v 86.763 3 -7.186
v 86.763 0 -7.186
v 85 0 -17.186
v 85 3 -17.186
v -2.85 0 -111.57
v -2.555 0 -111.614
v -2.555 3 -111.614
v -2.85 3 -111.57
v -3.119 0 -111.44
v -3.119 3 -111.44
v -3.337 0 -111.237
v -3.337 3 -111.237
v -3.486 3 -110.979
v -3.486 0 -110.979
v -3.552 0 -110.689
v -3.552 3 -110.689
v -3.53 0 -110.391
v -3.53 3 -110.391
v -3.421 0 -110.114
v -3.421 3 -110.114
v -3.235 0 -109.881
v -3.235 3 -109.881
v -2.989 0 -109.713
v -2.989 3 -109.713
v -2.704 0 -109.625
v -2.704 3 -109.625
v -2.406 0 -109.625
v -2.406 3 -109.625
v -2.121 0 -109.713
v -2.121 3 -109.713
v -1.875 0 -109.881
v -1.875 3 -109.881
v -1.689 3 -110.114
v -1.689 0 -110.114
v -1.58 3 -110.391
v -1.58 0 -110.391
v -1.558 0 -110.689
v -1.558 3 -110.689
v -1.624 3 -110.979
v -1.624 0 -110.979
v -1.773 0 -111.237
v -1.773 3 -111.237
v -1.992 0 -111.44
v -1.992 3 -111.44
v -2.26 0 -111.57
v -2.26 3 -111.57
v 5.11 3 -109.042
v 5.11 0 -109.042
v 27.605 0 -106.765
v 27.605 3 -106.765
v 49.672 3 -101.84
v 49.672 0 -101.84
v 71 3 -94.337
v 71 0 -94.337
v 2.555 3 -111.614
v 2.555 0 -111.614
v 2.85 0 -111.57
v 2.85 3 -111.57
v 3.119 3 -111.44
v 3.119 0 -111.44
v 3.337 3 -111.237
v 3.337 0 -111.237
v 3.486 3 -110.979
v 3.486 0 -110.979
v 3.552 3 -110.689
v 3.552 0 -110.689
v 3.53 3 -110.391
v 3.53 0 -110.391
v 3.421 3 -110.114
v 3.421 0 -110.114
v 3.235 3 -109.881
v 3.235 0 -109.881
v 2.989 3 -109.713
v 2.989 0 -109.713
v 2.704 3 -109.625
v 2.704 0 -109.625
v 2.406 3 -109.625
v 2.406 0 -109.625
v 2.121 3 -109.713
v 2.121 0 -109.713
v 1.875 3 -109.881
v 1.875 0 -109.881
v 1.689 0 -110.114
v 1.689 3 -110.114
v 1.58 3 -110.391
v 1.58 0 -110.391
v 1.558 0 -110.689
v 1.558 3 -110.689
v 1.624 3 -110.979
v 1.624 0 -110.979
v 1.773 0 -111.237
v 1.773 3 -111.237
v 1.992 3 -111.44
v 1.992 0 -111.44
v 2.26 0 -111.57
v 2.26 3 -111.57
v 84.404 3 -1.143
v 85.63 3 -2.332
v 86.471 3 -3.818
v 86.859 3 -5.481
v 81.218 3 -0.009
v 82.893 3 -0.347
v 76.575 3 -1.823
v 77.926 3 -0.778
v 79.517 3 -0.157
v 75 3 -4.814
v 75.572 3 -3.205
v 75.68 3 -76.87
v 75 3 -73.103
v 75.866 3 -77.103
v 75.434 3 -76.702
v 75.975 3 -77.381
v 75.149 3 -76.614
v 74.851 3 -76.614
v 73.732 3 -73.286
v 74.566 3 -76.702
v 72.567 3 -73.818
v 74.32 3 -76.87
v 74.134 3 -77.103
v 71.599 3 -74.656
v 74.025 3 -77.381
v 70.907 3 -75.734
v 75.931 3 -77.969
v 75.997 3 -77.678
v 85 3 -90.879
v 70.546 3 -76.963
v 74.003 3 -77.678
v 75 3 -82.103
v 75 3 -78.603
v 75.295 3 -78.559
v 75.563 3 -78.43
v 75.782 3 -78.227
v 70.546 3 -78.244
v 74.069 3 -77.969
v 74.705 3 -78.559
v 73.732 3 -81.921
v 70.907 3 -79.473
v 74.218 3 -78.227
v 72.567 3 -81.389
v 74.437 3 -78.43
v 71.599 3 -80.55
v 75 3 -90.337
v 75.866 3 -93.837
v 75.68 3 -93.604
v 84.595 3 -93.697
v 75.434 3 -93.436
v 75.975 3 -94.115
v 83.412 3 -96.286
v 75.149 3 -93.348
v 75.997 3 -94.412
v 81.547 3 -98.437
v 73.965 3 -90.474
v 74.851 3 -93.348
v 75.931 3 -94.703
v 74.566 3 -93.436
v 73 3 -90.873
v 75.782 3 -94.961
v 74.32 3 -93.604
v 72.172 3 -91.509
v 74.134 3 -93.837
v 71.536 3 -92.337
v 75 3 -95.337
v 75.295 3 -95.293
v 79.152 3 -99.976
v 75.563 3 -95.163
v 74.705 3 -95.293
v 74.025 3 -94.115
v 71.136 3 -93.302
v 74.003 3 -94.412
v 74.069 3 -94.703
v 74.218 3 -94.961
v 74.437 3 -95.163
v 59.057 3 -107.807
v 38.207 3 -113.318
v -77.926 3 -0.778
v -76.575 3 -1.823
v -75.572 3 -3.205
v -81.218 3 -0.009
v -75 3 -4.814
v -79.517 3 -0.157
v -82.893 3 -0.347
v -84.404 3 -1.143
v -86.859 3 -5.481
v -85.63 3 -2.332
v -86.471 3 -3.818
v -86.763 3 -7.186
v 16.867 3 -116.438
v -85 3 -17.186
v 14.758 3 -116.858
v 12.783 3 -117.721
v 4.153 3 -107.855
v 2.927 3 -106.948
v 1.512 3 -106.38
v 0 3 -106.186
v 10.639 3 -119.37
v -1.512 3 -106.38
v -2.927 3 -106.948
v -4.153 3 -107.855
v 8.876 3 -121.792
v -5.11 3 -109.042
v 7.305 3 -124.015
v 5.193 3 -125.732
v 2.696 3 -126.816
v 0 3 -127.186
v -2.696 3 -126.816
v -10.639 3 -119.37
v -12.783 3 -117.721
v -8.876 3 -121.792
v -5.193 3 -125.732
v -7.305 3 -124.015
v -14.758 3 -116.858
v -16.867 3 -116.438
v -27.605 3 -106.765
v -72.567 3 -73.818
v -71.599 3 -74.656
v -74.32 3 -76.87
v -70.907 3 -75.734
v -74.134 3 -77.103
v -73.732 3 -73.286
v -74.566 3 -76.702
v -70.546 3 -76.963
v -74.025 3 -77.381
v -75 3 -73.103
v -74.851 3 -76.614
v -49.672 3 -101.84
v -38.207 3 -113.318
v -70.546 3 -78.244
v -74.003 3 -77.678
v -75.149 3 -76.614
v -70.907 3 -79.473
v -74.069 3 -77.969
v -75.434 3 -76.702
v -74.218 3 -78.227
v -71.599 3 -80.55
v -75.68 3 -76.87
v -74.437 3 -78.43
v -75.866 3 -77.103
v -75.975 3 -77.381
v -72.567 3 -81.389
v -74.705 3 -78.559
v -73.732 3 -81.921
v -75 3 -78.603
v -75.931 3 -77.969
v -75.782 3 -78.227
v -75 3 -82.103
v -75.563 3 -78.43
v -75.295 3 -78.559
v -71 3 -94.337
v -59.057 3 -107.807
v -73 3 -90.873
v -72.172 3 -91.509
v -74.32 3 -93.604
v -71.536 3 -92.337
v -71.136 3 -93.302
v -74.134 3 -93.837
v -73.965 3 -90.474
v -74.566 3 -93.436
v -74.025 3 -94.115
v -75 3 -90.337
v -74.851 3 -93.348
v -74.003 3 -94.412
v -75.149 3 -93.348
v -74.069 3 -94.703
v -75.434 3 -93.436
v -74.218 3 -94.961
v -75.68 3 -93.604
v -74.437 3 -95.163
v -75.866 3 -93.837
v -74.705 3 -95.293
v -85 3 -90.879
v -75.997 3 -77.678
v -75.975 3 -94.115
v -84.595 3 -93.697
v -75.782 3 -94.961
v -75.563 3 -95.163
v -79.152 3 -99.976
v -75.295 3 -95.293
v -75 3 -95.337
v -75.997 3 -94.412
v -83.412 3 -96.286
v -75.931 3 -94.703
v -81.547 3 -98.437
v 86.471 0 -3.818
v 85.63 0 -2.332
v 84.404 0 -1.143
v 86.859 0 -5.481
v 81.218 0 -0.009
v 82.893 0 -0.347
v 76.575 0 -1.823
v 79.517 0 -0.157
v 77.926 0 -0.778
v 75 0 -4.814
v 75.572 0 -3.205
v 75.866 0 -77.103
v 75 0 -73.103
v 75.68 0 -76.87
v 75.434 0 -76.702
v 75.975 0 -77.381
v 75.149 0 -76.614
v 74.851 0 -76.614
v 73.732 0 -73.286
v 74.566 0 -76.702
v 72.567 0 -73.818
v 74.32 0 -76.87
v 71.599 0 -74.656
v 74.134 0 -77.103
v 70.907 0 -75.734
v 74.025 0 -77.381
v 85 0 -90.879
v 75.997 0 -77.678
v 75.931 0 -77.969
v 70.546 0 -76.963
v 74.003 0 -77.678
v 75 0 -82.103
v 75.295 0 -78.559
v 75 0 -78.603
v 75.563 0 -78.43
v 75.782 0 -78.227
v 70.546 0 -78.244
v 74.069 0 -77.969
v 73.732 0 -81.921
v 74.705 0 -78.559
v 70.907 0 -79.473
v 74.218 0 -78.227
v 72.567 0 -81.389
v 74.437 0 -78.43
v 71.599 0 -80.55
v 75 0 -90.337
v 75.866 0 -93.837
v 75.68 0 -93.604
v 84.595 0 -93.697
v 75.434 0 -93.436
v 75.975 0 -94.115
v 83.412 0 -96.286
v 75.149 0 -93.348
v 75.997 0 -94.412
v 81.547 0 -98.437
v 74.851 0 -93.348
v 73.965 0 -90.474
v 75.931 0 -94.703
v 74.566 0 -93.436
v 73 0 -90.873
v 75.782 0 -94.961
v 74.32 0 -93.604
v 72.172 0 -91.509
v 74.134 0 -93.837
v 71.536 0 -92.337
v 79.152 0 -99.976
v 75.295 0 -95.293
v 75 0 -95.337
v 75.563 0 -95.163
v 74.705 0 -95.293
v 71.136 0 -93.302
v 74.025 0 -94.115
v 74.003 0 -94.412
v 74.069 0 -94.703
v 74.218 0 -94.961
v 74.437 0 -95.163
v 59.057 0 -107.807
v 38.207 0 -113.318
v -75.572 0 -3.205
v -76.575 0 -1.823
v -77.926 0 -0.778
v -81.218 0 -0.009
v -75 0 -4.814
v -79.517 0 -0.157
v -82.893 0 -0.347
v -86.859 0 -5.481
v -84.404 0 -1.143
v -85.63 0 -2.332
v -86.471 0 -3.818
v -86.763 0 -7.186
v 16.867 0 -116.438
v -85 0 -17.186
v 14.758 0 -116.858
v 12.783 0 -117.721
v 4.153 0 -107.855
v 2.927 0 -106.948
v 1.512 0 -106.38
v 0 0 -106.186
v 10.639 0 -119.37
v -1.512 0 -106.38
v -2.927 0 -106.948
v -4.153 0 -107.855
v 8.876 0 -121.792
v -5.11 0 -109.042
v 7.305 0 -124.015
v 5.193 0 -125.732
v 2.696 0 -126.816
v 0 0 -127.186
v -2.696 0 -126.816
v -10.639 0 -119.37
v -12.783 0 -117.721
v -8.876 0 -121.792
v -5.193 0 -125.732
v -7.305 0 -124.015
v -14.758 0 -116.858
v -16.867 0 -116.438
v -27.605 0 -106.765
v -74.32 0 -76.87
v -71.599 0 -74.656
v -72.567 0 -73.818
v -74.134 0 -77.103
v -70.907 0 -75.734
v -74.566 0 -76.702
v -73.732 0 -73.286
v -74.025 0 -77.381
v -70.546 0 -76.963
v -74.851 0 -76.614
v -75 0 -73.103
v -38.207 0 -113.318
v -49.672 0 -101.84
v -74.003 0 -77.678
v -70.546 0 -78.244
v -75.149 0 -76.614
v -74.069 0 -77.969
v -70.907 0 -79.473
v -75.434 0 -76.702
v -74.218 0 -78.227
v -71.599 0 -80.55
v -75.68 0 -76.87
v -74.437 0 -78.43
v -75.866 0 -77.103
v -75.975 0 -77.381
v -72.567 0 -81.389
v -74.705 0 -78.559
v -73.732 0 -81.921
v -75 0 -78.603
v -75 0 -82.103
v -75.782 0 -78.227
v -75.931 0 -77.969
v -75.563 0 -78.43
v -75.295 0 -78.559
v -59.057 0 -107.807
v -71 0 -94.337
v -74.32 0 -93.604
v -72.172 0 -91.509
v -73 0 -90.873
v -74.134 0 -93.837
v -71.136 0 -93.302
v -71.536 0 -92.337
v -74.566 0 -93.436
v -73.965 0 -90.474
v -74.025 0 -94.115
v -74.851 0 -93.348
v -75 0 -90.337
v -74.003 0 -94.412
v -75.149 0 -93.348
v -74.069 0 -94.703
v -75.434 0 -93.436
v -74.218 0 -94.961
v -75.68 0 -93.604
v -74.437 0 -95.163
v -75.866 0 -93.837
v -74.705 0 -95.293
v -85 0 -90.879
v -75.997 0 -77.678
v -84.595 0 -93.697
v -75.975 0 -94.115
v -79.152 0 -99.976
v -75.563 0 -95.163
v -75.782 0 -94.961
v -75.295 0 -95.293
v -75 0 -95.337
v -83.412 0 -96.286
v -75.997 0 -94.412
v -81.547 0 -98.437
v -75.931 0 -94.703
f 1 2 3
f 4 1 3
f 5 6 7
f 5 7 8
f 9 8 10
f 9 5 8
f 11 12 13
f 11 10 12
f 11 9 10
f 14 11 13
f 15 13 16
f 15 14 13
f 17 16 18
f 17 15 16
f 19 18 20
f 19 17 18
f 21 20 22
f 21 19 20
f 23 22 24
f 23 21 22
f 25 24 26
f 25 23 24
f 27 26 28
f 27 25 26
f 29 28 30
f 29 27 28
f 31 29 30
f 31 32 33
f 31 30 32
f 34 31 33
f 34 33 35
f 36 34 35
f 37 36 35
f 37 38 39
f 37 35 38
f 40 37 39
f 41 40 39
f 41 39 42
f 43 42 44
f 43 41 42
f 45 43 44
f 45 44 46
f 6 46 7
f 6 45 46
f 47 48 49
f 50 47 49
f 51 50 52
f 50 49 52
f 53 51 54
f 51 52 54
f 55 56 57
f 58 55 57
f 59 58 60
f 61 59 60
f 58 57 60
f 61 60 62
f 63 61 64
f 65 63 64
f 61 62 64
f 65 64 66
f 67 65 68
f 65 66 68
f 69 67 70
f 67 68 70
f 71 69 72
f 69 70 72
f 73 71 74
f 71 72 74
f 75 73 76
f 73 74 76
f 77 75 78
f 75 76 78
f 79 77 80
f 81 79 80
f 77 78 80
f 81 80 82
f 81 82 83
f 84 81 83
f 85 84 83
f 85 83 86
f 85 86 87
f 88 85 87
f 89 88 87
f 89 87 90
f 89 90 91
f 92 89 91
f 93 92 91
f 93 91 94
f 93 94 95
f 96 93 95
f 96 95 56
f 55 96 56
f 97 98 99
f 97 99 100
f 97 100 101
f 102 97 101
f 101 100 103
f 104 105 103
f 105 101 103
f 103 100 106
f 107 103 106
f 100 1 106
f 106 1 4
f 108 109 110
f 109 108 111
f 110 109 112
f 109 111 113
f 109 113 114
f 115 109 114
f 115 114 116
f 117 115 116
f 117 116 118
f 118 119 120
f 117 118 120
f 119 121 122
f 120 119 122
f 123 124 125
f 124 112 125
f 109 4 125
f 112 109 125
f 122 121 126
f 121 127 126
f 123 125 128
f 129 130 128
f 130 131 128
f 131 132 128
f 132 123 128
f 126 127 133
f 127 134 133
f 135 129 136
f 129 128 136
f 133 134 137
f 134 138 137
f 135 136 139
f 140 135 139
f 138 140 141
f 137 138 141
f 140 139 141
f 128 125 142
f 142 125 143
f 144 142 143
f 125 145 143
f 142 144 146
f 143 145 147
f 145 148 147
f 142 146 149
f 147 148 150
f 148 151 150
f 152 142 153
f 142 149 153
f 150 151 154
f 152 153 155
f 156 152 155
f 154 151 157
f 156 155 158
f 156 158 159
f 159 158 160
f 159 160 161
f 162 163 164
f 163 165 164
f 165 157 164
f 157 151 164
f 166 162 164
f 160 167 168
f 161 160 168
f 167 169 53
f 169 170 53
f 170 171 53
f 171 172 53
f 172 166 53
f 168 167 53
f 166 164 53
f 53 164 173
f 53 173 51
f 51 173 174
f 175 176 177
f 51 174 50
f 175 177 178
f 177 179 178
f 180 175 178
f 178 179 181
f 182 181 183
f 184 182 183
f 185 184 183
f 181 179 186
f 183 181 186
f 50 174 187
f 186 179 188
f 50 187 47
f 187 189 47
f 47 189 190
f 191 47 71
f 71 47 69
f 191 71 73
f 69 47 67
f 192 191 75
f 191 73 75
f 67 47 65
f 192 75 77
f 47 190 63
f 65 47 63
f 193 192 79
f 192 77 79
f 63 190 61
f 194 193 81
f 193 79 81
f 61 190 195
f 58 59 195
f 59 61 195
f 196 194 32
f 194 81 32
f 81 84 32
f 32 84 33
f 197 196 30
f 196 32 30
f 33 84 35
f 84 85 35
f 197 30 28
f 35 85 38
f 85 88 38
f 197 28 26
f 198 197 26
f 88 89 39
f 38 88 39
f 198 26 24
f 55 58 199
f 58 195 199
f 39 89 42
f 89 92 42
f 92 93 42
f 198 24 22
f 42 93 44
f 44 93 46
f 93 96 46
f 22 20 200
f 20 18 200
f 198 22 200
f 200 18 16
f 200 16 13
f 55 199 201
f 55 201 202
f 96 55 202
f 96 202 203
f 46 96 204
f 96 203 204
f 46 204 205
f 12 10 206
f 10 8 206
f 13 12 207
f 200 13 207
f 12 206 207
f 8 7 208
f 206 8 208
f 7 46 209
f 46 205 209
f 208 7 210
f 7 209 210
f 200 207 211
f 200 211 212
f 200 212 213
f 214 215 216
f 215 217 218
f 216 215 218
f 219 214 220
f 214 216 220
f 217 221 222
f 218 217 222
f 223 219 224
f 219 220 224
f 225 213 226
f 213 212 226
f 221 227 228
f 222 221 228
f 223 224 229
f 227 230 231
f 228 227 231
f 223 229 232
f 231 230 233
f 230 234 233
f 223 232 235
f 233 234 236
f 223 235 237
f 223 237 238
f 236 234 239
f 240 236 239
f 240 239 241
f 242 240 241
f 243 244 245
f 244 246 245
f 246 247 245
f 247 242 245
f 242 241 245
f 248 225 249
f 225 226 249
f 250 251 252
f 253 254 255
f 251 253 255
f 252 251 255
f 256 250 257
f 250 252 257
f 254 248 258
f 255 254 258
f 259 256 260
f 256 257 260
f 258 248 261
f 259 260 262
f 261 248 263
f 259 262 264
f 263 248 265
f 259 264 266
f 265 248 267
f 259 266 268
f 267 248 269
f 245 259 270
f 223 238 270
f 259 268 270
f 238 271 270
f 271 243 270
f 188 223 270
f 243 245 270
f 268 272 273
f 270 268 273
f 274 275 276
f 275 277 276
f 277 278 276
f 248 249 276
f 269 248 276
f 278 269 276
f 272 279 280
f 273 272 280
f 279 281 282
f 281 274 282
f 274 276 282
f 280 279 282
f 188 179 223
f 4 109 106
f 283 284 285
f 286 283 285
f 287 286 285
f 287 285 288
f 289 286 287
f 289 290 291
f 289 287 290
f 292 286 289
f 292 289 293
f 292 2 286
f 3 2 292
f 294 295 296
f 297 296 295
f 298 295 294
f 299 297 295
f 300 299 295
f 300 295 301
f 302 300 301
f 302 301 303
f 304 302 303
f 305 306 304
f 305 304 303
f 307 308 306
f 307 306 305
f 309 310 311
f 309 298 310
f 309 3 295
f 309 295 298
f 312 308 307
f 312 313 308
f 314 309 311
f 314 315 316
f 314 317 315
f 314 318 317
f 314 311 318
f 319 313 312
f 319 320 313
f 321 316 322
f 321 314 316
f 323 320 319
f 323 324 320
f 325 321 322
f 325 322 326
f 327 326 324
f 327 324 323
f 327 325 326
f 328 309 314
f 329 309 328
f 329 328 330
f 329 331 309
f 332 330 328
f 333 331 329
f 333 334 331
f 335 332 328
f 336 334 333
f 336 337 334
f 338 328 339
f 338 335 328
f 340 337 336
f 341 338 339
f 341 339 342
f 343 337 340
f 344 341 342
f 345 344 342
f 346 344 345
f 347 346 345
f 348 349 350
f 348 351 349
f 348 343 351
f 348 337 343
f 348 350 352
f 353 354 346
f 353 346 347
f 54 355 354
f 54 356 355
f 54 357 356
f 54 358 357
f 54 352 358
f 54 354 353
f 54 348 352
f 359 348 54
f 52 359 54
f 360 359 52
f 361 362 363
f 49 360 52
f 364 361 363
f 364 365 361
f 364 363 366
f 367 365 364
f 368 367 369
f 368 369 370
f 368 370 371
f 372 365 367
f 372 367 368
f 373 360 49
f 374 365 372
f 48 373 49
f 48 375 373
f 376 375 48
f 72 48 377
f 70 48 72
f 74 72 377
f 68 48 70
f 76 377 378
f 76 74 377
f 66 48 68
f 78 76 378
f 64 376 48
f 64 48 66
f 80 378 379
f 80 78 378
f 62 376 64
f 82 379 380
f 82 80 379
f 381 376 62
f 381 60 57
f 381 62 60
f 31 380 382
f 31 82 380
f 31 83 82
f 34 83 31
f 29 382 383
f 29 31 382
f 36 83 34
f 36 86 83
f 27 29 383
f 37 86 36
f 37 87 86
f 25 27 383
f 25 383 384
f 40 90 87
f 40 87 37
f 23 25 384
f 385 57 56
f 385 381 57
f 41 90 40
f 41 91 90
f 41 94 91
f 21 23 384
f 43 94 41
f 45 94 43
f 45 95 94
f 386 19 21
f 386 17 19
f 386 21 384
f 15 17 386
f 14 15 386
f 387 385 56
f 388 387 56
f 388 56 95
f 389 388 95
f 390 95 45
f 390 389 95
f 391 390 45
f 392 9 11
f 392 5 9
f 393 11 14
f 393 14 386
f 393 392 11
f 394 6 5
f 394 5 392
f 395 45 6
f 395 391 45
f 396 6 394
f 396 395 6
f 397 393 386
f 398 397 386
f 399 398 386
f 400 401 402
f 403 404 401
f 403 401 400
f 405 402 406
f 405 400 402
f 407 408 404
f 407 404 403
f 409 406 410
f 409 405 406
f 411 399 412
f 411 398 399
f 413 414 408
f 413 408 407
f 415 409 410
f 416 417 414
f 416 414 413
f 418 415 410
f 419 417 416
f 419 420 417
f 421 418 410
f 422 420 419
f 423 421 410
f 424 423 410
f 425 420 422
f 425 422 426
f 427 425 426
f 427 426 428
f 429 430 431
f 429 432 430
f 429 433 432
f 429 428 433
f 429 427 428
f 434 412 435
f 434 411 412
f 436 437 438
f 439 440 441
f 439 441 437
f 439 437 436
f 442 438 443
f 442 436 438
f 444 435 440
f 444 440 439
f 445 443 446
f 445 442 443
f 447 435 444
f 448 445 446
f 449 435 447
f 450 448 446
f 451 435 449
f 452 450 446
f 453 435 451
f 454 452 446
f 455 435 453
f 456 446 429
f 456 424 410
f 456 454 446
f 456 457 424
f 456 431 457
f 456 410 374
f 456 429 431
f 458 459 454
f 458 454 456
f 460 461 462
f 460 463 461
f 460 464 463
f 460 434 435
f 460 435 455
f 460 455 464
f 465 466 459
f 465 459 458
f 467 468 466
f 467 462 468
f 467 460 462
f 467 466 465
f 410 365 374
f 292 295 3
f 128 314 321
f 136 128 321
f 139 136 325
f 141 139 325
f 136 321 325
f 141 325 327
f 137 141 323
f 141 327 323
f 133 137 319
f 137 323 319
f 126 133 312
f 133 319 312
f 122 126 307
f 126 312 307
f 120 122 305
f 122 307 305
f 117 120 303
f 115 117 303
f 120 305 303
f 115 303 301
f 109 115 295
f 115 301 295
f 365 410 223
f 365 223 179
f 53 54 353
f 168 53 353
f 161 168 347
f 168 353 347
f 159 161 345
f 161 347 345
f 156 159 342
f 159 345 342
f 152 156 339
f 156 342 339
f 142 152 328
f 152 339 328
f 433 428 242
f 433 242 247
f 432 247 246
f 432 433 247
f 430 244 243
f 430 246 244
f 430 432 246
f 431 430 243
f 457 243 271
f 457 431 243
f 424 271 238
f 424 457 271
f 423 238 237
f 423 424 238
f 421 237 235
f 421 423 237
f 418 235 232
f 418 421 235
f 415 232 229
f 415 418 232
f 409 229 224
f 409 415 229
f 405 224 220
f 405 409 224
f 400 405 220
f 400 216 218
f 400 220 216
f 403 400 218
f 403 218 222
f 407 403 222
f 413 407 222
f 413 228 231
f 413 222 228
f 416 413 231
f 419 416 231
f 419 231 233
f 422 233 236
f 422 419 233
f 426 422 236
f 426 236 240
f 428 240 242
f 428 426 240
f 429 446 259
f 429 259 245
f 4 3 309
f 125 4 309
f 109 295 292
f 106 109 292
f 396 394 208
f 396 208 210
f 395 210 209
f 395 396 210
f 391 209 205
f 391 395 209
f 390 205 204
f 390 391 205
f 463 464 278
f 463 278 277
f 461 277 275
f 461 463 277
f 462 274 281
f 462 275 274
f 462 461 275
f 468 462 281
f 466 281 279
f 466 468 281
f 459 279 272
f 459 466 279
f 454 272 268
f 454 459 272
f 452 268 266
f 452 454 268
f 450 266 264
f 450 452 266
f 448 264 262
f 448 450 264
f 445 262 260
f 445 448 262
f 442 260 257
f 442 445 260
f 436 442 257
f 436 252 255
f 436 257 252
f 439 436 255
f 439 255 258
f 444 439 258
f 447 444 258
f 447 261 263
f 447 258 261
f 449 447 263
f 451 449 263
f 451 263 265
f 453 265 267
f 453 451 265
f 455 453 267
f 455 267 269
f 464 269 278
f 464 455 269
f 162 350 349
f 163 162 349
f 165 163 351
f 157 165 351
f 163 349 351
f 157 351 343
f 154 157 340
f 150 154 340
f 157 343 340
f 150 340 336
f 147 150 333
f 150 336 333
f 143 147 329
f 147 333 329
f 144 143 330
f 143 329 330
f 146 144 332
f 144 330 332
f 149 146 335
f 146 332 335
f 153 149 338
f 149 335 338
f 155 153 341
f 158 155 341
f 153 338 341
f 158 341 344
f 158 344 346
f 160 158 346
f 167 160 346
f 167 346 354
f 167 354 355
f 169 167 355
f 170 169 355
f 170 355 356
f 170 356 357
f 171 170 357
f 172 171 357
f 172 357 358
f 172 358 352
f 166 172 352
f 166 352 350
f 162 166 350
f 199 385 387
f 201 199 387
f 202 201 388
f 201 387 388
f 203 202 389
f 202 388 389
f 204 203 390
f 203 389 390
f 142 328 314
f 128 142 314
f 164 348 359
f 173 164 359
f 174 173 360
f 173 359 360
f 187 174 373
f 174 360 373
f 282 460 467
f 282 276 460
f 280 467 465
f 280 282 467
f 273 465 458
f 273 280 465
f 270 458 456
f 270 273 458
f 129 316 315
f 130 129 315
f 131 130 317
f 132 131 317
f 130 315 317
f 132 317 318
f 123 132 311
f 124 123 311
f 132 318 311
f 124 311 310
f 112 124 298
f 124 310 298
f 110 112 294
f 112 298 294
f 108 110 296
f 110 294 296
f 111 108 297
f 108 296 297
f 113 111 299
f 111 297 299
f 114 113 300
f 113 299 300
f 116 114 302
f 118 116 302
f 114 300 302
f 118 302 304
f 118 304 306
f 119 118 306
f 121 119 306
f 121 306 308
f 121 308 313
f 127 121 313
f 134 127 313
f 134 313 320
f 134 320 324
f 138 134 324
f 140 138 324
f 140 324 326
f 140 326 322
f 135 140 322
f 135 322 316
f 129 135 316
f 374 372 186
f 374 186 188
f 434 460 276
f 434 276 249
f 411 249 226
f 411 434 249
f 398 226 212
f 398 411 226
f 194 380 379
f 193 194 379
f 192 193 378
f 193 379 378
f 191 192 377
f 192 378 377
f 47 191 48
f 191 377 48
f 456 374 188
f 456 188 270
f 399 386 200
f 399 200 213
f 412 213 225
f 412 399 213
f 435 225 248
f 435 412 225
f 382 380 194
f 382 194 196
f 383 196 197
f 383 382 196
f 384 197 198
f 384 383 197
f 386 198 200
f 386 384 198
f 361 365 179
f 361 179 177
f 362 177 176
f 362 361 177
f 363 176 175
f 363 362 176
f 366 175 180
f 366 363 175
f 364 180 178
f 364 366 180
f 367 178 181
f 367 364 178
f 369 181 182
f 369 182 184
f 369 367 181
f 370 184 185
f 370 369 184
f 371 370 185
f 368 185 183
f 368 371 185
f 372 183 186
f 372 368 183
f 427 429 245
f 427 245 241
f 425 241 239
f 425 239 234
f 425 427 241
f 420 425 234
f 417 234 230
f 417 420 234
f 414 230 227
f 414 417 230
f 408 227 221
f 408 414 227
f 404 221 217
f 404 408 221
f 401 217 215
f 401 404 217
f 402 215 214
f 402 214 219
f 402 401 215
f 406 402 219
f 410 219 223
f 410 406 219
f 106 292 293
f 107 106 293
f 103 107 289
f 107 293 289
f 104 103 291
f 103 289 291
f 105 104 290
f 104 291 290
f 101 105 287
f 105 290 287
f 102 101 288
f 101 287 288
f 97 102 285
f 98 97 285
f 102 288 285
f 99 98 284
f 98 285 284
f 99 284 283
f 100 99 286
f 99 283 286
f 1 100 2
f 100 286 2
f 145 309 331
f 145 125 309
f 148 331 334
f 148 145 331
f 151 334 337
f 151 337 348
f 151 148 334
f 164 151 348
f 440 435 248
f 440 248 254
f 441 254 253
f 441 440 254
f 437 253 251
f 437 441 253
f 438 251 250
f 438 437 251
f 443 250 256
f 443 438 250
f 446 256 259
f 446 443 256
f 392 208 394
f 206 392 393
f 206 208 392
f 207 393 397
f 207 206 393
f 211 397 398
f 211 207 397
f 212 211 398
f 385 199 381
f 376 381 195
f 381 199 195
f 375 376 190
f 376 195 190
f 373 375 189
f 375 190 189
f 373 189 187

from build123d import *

# Parameters (mm, degrees)
BOSS_EXTRUDE2_DEPTH      = 3
FILLET3_R                = 10
FILLET3_OF_MIRROR3_R     = 10
BOSS_EXTRUDE3_START      = -3
BOSS_EXTRUDE3_DEPTH      = 3
F_2_0_2_DIAMETER_HOLE1_D = 2


with BuildPart() as part:
    # Sketch2 → Boss-Extrude2 (new body)
    with BuildSketch(Plane(origin=(0, 0, 0), x_dir=(1, 0, 0), z_dir=(0, 1, 0))):
        with BuildLine():
            ThreePointArc((0, 117.185905081), (5, 117.120320028), (9.996559473, 116.923609999))
            ThreePointArc((9.996559473, 116.923609999), (7.163202874, 124.163621369), (0, 127.185905081))
            Line((0, 127.185905081), (0, 117.185905081))
        make_face()
        with BuildLine():
            Line((75, 92.603329386), (75, 4.814094919))
            ThreePointArc((75, 4.814094919), (82.067539985, 0.118365096), (86.763269807, 7.185905081))
            Line((86.763269807, 7.185905081), (85, 17.185905081))
            Line((85, 17.185905081), (85, 97.185905081))
            ThreePointArc((85, 97.185905081), (43.660622991, 112.118552795), (0, 117.185905081))
            Line((0, 117.185905081), (0, 109.185905081))
            ThreePointArc((0, 109.185905081), (38.343884954, 104.711356725), (75, 92.603329386))
        make_face()
    boss_extrude2 = extrude(amount=BOSS_EXTRUDE2_DEPTH)

    # Fillet3
    fillet3_edges = [part.edges().sort_by_distance(p)[0] for p in [
        (9.996559473, 1.5, -116.923609999),
        (85, 1.5, -97.185905081),
    ]]
    fillet(fillet3_edges, radius=FILLET3_R)

    # Mirror3: Boss-Extrude2 across plane
    add(boss_extrude2.mirror(Plane(origin=(0, 3, 0), x_dir=(0, 0, 1), z_dir=(1, 0, 0))))

    # Fillet3 of Mirror3
    fillet3_of_mirror3_edges = [part.edges().sort_by_distance(p)[0] for p in [
        (-9.996559473, 1.5, -116.923609999),
        (-85, 1.5, -97.185905081),
    ]]
    fillet(fillet3_of_mirror3_edges, radius=FILLET3_OF_MIRROR3_R)

    # Sketch4 → Boss-Extrude3 (add)
    with BuildSketch(Plane(origin=(0, 3, 0), x_dir=(1, 0, 0), z_dir=(0, 1, 0)).offset(BOSS_EXTRUDE3_START)):
        with BuildLine():
            Line((0, 109.185905081), (0, 106.185905081))
            ThreePointArc((0, 106.185905081), (2.927170094, 106.948379402), (5.110376179, 109.042013335))
            ThreePointArc((5.110376179, 109.042013335), (2.555670493, 109.131091975), (0, 109.185905081))
        make_face()
        with BuildLine():
            ThreePointArc((75, 92.603329386), (73.004956974, 93.481711721), (71, 94.337223109))
            ThreePointArc((71, 94.337223109), (72.171572875, 91.508795985), (75, 90.337223109))
            Line((75, 90.337223109), (75, 92.603329386))
        make_face()
        with BuildLine():
            Line((75, 73.103329386), (75, 82.103329386))
            ThreePointArc((75, 82.103329386), (70.5, 77.603329386), (75, 73.103329386))
        make_face()
    boss_extrude3 = extrude(amount=BOSS_EXTRUDE3_DEPTH)

    # Mirror4: Boss-Extrude3 across plane
    add(boss_extrude3.mirror(Plane(origin=(0, 0, 0), x_dir=(0, 0, 1), z_dir=(1, 0, 0))))

    # Ø2.0 (2) Diameter Hole1 (through all)
    with Locations(Plane(origin=(2.555188089, 3, -110.613959208), x_dir=(0, 0, 1), z_dir=(0, 1, 0))):
        with Locations((0, 0), (16.276736099, 72.444811911), (33.010629822, 72.444811911)):
            f_2_0_2_diameter_hole1 = Hole(F_2_0_2_DIAMETER_HOLE1_D / 2)

    # Mirror5: Ø2.0 (2) Diameter Hole1 across plane
    add(f_2_0_2_diameter_hole1.mirror(Plane(origin=(0, 0, 0), x_dir=(0, 0, 1), z_dir=(1, 0, 0))), mode=Mode.SUBTRACT)


solid = part.part
